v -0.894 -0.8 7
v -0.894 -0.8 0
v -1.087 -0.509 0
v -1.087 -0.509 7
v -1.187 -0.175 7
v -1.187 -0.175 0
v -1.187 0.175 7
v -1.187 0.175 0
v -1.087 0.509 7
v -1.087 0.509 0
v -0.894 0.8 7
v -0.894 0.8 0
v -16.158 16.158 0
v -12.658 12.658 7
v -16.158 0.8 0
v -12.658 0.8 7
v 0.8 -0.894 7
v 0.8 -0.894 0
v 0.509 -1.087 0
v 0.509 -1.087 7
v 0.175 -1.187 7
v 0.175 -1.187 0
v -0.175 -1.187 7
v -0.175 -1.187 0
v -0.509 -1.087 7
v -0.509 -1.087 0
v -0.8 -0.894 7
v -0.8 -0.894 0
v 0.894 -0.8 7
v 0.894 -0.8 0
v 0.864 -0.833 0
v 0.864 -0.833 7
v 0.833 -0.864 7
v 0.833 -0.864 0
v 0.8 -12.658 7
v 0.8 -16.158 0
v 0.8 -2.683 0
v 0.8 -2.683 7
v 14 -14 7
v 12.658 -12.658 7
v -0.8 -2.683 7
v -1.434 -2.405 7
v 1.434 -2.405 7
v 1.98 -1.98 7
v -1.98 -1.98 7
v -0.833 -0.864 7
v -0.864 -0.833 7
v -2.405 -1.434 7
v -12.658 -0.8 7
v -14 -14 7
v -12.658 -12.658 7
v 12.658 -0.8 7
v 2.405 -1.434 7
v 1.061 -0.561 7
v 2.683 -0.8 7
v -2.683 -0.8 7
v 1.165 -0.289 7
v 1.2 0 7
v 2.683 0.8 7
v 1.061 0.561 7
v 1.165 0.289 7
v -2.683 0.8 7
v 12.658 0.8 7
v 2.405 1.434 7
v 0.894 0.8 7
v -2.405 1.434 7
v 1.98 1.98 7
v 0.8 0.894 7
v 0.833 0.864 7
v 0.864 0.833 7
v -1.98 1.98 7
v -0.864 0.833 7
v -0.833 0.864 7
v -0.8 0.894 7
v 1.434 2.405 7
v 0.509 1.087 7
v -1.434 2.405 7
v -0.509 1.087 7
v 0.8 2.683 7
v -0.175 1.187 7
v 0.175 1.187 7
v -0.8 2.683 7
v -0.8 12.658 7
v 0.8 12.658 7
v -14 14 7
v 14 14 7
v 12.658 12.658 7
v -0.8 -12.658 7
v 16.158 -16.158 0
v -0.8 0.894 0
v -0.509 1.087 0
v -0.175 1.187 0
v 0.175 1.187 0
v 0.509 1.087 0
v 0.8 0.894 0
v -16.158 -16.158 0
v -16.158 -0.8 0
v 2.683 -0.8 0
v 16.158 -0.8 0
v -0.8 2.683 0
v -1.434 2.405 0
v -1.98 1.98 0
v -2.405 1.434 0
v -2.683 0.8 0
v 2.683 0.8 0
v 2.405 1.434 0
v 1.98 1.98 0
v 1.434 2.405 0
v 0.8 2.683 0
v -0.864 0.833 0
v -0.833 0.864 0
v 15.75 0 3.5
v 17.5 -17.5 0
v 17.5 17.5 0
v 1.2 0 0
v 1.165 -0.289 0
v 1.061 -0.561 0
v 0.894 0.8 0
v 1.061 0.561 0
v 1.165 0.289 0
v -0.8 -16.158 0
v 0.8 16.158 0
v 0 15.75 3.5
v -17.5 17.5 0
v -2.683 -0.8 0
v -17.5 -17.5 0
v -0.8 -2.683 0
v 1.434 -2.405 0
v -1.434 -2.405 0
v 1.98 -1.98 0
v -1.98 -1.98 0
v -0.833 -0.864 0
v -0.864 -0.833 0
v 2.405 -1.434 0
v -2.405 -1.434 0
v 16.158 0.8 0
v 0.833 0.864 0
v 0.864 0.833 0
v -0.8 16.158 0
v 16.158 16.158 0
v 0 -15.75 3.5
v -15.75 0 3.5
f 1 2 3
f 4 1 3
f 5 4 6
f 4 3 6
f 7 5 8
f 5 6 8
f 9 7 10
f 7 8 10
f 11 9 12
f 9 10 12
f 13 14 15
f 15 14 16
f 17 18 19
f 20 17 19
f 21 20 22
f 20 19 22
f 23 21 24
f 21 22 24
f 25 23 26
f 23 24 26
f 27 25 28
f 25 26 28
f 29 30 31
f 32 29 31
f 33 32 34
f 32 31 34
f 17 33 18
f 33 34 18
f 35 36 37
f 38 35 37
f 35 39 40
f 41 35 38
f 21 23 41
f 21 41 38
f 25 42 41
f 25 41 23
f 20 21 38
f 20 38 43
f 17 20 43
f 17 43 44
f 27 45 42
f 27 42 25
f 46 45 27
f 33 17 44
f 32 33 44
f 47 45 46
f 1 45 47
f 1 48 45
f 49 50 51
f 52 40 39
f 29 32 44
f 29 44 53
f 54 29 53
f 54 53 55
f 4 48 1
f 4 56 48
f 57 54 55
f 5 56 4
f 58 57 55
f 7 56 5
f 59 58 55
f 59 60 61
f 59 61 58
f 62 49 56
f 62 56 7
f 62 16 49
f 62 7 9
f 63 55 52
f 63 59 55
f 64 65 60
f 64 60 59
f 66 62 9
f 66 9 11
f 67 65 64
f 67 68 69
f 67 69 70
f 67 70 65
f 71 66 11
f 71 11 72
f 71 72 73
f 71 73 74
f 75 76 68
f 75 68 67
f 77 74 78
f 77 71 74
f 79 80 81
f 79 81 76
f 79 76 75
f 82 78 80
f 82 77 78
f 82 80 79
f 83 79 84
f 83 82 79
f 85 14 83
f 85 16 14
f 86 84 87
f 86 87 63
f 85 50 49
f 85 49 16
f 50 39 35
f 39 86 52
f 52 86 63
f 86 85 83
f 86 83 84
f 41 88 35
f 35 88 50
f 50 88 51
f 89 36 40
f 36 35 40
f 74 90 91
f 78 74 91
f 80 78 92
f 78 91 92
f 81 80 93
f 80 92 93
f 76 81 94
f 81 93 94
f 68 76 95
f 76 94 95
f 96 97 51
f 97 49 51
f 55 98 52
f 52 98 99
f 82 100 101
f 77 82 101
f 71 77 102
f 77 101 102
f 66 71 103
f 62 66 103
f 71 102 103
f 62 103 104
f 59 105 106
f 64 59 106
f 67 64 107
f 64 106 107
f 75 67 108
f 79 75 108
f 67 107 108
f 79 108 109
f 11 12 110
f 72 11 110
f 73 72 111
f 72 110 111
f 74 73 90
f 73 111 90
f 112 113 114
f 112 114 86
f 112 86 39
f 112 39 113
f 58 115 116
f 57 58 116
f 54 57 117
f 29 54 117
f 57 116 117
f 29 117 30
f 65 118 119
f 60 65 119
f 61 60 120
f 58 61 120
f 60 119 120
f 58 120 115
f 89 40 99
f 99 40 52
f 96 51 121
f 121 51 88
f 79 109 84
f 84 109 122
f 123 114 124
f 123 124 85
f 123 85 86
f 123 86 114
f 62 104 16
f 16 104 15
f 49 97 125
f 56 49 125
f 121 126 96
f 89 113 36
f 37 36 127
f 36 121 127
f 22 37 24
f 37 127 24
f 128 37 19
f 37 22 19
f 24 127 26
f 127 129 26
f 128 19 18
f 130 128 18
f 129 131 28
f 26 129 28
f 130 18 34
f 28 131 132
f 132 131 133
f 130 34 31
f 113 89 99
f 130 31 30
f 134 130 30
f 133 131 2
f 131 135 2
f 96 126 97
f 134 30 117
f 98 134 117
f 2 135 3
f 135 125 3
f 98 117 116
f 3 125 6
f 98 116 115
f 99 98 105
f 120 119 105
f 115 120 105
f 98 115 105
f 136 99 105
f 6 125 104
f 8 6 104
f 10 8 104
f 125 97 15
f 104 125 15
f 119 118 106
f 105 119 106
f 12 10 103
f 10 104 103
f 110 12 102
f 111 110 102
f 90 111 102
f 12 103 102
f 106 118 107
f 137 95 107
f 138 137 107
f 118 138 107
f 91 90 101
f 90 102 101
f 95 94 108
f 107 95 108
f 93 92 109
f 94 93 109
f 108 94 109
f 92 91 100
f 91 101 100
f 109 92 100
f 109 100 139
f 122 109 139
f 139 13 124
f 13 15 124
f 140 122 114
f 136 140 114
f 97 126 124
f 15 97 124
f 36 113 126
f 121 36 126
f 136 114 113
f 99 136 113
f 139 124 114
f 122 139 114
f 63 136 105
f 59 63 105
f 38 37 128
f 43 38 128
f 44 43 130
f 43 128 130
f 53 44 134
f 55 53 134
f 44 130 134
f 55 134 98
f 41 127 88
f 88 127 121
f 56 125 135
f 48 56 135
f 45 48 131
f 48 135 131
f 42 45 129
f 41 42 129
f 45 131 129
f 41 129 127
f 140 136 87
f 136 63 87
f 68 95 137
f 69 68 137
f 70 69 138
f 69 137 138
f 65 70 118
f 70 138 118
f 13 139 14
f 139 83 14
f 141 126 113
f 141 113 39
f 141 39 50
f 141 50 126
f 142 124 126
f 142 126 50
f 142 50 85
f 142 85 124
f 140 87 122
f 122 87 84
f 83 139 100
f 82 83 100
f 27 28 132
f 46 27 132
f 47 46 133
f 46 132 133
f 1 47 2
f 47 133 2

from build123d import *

# Parameters (mm, degrees)
F0_W       = 35
F0_H       = 35
F2_W       = 28
F2_H       = 28
F4_T       = -1.2
F6_DEPTH   = 7
F7_SIZE2   = 3
F7_SIZE    = 6
F7_2_SIZE2 = 3
F7_2_SIZE  = 6
F7_3_SIZE2 = 3
F7_3_SIZE  = 6
F7_4_SIZE2 = 3
F7_4_SIZE  = 6


with BuildPart() as f3:
    # F0 (on Top) → F3 section 0
    with BuildSketch(Plane.XY):
        Rectangle(F0_W, F0_H)
    # F2 (on offset) → F3 section 1
    with BuildSketch(Plane.XY.offset(7)):
        Rectangle(F2_W, F2_H)
    loft()

    # F4
    f4_openings = [f3.faces().sort_by_distance(p)[0] for p in [
        (0, 0, 7),
        (0, 0, 0),
    ]]
    offset(amount=F4_T, openings=f4_openings)


with BuildPart() as f6:
    # F5 (on Top) → F6 (new body, through all)
    with BuildSketch(Plane.XY):
        with BuildLine():
            ThreePointArc((-2.683281573, -0.8), (-2.8, 0), (-2.683281573, 0.8))
            Line((-2.683281573, 0.8), (-16.2, 0.8))
            Line((-16.2, 0.8), (-16.2, -0.8))
            Line((-16.2, -0.8), (-2.683281573, -0.8))
        make_face()
        with BuildLine():
            ThreePointArc((-0.894427191, -0.8), (-1.2, 0), (-0.894427191, 0.8))
            Line((-0.894427191, 0.8), (-2.683281573, 0.8))
            ThreePointArc((-2.683281573, 0.8), (-2.8, 0), (-2.683281573, -0.8))
            Line((-2.683281573, -0.8), (-0.894427191, -0.8))
        make_face()
        with BuildLine():
            ThreePointArc((-0.894427191, 0.8), (-0.8485281374, 0.8485281374), (-0.8, 0.894427191))
            Line((-0.8, 0.894427191), (-0.8, 2.683281573))
            ThreePointArc((-0.8, 2.683281573), (-1.9798989873, 1.9798989873), (-2.683281573, 0.8))
            Line((-2.683281573, 0.8), (-0.894427191, 0.8))
        make_face()
        with BuildLine():
            ThreePointArc((-0.8, 0.894427191), (0, 1.2), (0.8, 0.894427191))
            Line((0.8, 0.894427191), (0.8, 2.683281573))
            ThreePointArc((0.8, 2.683281573), (0, 2.8), (-0.8, 2.683281573))
            Line((-0.8, 2.683281573), (-0.8, 0.894427191))
        make_face()
        with BuildLine():
            ThreePointArc((-0.8, 2.683281573), (0, 2.8), (0.8, 2.683281573))
            Line((0.8, 2.683281573), (0.8, 16.2))
            Line((0.8, 16.2), (-0.8, 16.2))
            Line((-0.8, 16.2), (-0.8, 2.683281573))
        make_face()
        with BuildLine():
            ThreePointArc((0.8, 0.894427191), (0.8485281374, 0.8485281374), (0.894427191, 0.8))
            Line((0.894427191, 0.8), (2.683281573, 0.8))
            ThreePointArc((2.683281573, 0.8), (1.9798989873, 1.9798989873), (0.8, 2.683281573))
            Line((0.8, 2.683281573), (0.8, 0.894427191))
        make_face()
        with BuildLine():
            ThreePointArc((0.894427191, 0.8), (1.1210068308, 0.4281865077), (1.2, 0))
            ThreePointArc((1.2, 0), (1.1210068308, -0.4281865077), (0.894427191, -0.8))
            Line((0.894427191, -0.8), (2.683281573, -0.8))
            ThreePointArc((2.683281573, -0.8), (2.7706667433, -0.40423483), (2.8, 0))
            ThreePointArc((2.8, 0), (2.7706667433, 0.40423483), (2.683281573, 0.8))
            Line((2.683281573, 0.8), (0.894427191, 0.8))
        make_face()
        with BuildLine():
            Line((16.2, 0.8), (2.683281573, 0.8))
            ThreePointArc((2.683281573, 0.8), (2.7706667433, 0.40423483), (2.8, 0))
            ThreePointArc((2.8, 0), (2.7706667433, -0.40423483), (2.683281573, -0.8))
            Line((2.683281573, -0.8), (16.2, -0.8))
            Line((16.2, -0.8), (16.2, 0.8))
        make_face()
        with BuildLine():
            Line((2.683281573, -0.8), (0.894427191, -0.8))
            ThreePointArc((0.894427191, -0.8), (0.8485281374, -0.8485281374), (0.8, -0.894427191))
            Line((0.8, -0.894427191), (0.8, -2.683281573))
            ThreePointArc((0.8, -2.683281573), (1.9798989873, -1.9798989873), (2.683281573, -0.8))
        make_face()
        with BuildLine():
            Line((-0.8, -2.683281573), (-0.8, -0.894427191))
            ThreePointArc((-0.8, -0.894427191), (-0.8485281374, -0.8485281374), (-0.894427191, -0.8))
            Line((-0.894427191, -0.8), (-2.683281573, -0.8))
            ThreePointArc((-2.683281573, -0.8), (-1.9798989873, -1.9798989873), (-0.8, -2.683281573))
        make_face()
        with BuildLine():
            Line((0.8, -2.683281573), (0.8, -0.894427191))
            ThreePointArc((0.8, -0.894427191), (0, -1.2), (-0.8, -0.894427191))
            Line((-0.8, -0.894427191), (-0.8, -2.683281573))
            ThreePointArc((-0.8, -2.683281573), (0, -2.8), (0.8, -2.683281573))
        make_face()
        with BuildLine():
            Line((0.8, -16.2), (0.8, -2.683281573))
            ThreePointArc((0.8, -2.683281573), (0, -2.8), (-0.8, -2.683281573))
            Line((-0.8, -2.683281573), (-0.8, -16.2))
            Line((-0.8, -16.2), (0.8, -16.2))
        make_face()
    extrude(amount=F6_DEPTH)

    # F7
    f7_edges = [f6.edges().sort_by_distance(p)[0] for p in [
        (-16.2, 0, 7),
    ]]
    f7_side = f6.faces().sort_by_distance((-16.2, 0, 3.5))[0]
    chamfer(f7_edges, length=F7_SIZE, length2=F7_SIZE2, reference=f7_side)

    # F7#2
    f7_2_edges = [f6.edges().sort_by_distance(p)[0] for p in [
        (0, 16.2, 7),
    ]]
    f7_2_side = f6.faces().sort_by_distance((0, 16.2, 3.5))[0]
    chamfer(f7_2_edges, length=F7_2_SIZE, length2=F7_2_SIZE2, reference=f7_2_side)

    # F7#3
    f7_3_edges = [f6.edges().sort_by_distance(p)[0] for p in [
        (16.2, 0, 7),
    ]]
    f7_3_side = f6.faces().sort_by_distance((16.2, 0, 3.5))[0]
    chamfer(f7_3_edges, length=F7_3_SIZE, length2=F7_3_SIZE2, reference=f7_3_side)

    # F7#4
    f7_4_edges = [f6.edges().sort_by_distance(p)[0] for p in [
        (0, -16.2, 7),
    ]]
    f7_4_side = f6.faces().sort_by_distance((0, -16.2, 3.5))[0]
    chamfer(f7_4_edges, length=F7_4_SIZE, length2=F7_4_SIZE2, reference=f7_4_side)


with BuildPart() as f3_1:
    add(f3.part)

    # F8: union F6
    add(f6.part)


solid = f3_1.part
